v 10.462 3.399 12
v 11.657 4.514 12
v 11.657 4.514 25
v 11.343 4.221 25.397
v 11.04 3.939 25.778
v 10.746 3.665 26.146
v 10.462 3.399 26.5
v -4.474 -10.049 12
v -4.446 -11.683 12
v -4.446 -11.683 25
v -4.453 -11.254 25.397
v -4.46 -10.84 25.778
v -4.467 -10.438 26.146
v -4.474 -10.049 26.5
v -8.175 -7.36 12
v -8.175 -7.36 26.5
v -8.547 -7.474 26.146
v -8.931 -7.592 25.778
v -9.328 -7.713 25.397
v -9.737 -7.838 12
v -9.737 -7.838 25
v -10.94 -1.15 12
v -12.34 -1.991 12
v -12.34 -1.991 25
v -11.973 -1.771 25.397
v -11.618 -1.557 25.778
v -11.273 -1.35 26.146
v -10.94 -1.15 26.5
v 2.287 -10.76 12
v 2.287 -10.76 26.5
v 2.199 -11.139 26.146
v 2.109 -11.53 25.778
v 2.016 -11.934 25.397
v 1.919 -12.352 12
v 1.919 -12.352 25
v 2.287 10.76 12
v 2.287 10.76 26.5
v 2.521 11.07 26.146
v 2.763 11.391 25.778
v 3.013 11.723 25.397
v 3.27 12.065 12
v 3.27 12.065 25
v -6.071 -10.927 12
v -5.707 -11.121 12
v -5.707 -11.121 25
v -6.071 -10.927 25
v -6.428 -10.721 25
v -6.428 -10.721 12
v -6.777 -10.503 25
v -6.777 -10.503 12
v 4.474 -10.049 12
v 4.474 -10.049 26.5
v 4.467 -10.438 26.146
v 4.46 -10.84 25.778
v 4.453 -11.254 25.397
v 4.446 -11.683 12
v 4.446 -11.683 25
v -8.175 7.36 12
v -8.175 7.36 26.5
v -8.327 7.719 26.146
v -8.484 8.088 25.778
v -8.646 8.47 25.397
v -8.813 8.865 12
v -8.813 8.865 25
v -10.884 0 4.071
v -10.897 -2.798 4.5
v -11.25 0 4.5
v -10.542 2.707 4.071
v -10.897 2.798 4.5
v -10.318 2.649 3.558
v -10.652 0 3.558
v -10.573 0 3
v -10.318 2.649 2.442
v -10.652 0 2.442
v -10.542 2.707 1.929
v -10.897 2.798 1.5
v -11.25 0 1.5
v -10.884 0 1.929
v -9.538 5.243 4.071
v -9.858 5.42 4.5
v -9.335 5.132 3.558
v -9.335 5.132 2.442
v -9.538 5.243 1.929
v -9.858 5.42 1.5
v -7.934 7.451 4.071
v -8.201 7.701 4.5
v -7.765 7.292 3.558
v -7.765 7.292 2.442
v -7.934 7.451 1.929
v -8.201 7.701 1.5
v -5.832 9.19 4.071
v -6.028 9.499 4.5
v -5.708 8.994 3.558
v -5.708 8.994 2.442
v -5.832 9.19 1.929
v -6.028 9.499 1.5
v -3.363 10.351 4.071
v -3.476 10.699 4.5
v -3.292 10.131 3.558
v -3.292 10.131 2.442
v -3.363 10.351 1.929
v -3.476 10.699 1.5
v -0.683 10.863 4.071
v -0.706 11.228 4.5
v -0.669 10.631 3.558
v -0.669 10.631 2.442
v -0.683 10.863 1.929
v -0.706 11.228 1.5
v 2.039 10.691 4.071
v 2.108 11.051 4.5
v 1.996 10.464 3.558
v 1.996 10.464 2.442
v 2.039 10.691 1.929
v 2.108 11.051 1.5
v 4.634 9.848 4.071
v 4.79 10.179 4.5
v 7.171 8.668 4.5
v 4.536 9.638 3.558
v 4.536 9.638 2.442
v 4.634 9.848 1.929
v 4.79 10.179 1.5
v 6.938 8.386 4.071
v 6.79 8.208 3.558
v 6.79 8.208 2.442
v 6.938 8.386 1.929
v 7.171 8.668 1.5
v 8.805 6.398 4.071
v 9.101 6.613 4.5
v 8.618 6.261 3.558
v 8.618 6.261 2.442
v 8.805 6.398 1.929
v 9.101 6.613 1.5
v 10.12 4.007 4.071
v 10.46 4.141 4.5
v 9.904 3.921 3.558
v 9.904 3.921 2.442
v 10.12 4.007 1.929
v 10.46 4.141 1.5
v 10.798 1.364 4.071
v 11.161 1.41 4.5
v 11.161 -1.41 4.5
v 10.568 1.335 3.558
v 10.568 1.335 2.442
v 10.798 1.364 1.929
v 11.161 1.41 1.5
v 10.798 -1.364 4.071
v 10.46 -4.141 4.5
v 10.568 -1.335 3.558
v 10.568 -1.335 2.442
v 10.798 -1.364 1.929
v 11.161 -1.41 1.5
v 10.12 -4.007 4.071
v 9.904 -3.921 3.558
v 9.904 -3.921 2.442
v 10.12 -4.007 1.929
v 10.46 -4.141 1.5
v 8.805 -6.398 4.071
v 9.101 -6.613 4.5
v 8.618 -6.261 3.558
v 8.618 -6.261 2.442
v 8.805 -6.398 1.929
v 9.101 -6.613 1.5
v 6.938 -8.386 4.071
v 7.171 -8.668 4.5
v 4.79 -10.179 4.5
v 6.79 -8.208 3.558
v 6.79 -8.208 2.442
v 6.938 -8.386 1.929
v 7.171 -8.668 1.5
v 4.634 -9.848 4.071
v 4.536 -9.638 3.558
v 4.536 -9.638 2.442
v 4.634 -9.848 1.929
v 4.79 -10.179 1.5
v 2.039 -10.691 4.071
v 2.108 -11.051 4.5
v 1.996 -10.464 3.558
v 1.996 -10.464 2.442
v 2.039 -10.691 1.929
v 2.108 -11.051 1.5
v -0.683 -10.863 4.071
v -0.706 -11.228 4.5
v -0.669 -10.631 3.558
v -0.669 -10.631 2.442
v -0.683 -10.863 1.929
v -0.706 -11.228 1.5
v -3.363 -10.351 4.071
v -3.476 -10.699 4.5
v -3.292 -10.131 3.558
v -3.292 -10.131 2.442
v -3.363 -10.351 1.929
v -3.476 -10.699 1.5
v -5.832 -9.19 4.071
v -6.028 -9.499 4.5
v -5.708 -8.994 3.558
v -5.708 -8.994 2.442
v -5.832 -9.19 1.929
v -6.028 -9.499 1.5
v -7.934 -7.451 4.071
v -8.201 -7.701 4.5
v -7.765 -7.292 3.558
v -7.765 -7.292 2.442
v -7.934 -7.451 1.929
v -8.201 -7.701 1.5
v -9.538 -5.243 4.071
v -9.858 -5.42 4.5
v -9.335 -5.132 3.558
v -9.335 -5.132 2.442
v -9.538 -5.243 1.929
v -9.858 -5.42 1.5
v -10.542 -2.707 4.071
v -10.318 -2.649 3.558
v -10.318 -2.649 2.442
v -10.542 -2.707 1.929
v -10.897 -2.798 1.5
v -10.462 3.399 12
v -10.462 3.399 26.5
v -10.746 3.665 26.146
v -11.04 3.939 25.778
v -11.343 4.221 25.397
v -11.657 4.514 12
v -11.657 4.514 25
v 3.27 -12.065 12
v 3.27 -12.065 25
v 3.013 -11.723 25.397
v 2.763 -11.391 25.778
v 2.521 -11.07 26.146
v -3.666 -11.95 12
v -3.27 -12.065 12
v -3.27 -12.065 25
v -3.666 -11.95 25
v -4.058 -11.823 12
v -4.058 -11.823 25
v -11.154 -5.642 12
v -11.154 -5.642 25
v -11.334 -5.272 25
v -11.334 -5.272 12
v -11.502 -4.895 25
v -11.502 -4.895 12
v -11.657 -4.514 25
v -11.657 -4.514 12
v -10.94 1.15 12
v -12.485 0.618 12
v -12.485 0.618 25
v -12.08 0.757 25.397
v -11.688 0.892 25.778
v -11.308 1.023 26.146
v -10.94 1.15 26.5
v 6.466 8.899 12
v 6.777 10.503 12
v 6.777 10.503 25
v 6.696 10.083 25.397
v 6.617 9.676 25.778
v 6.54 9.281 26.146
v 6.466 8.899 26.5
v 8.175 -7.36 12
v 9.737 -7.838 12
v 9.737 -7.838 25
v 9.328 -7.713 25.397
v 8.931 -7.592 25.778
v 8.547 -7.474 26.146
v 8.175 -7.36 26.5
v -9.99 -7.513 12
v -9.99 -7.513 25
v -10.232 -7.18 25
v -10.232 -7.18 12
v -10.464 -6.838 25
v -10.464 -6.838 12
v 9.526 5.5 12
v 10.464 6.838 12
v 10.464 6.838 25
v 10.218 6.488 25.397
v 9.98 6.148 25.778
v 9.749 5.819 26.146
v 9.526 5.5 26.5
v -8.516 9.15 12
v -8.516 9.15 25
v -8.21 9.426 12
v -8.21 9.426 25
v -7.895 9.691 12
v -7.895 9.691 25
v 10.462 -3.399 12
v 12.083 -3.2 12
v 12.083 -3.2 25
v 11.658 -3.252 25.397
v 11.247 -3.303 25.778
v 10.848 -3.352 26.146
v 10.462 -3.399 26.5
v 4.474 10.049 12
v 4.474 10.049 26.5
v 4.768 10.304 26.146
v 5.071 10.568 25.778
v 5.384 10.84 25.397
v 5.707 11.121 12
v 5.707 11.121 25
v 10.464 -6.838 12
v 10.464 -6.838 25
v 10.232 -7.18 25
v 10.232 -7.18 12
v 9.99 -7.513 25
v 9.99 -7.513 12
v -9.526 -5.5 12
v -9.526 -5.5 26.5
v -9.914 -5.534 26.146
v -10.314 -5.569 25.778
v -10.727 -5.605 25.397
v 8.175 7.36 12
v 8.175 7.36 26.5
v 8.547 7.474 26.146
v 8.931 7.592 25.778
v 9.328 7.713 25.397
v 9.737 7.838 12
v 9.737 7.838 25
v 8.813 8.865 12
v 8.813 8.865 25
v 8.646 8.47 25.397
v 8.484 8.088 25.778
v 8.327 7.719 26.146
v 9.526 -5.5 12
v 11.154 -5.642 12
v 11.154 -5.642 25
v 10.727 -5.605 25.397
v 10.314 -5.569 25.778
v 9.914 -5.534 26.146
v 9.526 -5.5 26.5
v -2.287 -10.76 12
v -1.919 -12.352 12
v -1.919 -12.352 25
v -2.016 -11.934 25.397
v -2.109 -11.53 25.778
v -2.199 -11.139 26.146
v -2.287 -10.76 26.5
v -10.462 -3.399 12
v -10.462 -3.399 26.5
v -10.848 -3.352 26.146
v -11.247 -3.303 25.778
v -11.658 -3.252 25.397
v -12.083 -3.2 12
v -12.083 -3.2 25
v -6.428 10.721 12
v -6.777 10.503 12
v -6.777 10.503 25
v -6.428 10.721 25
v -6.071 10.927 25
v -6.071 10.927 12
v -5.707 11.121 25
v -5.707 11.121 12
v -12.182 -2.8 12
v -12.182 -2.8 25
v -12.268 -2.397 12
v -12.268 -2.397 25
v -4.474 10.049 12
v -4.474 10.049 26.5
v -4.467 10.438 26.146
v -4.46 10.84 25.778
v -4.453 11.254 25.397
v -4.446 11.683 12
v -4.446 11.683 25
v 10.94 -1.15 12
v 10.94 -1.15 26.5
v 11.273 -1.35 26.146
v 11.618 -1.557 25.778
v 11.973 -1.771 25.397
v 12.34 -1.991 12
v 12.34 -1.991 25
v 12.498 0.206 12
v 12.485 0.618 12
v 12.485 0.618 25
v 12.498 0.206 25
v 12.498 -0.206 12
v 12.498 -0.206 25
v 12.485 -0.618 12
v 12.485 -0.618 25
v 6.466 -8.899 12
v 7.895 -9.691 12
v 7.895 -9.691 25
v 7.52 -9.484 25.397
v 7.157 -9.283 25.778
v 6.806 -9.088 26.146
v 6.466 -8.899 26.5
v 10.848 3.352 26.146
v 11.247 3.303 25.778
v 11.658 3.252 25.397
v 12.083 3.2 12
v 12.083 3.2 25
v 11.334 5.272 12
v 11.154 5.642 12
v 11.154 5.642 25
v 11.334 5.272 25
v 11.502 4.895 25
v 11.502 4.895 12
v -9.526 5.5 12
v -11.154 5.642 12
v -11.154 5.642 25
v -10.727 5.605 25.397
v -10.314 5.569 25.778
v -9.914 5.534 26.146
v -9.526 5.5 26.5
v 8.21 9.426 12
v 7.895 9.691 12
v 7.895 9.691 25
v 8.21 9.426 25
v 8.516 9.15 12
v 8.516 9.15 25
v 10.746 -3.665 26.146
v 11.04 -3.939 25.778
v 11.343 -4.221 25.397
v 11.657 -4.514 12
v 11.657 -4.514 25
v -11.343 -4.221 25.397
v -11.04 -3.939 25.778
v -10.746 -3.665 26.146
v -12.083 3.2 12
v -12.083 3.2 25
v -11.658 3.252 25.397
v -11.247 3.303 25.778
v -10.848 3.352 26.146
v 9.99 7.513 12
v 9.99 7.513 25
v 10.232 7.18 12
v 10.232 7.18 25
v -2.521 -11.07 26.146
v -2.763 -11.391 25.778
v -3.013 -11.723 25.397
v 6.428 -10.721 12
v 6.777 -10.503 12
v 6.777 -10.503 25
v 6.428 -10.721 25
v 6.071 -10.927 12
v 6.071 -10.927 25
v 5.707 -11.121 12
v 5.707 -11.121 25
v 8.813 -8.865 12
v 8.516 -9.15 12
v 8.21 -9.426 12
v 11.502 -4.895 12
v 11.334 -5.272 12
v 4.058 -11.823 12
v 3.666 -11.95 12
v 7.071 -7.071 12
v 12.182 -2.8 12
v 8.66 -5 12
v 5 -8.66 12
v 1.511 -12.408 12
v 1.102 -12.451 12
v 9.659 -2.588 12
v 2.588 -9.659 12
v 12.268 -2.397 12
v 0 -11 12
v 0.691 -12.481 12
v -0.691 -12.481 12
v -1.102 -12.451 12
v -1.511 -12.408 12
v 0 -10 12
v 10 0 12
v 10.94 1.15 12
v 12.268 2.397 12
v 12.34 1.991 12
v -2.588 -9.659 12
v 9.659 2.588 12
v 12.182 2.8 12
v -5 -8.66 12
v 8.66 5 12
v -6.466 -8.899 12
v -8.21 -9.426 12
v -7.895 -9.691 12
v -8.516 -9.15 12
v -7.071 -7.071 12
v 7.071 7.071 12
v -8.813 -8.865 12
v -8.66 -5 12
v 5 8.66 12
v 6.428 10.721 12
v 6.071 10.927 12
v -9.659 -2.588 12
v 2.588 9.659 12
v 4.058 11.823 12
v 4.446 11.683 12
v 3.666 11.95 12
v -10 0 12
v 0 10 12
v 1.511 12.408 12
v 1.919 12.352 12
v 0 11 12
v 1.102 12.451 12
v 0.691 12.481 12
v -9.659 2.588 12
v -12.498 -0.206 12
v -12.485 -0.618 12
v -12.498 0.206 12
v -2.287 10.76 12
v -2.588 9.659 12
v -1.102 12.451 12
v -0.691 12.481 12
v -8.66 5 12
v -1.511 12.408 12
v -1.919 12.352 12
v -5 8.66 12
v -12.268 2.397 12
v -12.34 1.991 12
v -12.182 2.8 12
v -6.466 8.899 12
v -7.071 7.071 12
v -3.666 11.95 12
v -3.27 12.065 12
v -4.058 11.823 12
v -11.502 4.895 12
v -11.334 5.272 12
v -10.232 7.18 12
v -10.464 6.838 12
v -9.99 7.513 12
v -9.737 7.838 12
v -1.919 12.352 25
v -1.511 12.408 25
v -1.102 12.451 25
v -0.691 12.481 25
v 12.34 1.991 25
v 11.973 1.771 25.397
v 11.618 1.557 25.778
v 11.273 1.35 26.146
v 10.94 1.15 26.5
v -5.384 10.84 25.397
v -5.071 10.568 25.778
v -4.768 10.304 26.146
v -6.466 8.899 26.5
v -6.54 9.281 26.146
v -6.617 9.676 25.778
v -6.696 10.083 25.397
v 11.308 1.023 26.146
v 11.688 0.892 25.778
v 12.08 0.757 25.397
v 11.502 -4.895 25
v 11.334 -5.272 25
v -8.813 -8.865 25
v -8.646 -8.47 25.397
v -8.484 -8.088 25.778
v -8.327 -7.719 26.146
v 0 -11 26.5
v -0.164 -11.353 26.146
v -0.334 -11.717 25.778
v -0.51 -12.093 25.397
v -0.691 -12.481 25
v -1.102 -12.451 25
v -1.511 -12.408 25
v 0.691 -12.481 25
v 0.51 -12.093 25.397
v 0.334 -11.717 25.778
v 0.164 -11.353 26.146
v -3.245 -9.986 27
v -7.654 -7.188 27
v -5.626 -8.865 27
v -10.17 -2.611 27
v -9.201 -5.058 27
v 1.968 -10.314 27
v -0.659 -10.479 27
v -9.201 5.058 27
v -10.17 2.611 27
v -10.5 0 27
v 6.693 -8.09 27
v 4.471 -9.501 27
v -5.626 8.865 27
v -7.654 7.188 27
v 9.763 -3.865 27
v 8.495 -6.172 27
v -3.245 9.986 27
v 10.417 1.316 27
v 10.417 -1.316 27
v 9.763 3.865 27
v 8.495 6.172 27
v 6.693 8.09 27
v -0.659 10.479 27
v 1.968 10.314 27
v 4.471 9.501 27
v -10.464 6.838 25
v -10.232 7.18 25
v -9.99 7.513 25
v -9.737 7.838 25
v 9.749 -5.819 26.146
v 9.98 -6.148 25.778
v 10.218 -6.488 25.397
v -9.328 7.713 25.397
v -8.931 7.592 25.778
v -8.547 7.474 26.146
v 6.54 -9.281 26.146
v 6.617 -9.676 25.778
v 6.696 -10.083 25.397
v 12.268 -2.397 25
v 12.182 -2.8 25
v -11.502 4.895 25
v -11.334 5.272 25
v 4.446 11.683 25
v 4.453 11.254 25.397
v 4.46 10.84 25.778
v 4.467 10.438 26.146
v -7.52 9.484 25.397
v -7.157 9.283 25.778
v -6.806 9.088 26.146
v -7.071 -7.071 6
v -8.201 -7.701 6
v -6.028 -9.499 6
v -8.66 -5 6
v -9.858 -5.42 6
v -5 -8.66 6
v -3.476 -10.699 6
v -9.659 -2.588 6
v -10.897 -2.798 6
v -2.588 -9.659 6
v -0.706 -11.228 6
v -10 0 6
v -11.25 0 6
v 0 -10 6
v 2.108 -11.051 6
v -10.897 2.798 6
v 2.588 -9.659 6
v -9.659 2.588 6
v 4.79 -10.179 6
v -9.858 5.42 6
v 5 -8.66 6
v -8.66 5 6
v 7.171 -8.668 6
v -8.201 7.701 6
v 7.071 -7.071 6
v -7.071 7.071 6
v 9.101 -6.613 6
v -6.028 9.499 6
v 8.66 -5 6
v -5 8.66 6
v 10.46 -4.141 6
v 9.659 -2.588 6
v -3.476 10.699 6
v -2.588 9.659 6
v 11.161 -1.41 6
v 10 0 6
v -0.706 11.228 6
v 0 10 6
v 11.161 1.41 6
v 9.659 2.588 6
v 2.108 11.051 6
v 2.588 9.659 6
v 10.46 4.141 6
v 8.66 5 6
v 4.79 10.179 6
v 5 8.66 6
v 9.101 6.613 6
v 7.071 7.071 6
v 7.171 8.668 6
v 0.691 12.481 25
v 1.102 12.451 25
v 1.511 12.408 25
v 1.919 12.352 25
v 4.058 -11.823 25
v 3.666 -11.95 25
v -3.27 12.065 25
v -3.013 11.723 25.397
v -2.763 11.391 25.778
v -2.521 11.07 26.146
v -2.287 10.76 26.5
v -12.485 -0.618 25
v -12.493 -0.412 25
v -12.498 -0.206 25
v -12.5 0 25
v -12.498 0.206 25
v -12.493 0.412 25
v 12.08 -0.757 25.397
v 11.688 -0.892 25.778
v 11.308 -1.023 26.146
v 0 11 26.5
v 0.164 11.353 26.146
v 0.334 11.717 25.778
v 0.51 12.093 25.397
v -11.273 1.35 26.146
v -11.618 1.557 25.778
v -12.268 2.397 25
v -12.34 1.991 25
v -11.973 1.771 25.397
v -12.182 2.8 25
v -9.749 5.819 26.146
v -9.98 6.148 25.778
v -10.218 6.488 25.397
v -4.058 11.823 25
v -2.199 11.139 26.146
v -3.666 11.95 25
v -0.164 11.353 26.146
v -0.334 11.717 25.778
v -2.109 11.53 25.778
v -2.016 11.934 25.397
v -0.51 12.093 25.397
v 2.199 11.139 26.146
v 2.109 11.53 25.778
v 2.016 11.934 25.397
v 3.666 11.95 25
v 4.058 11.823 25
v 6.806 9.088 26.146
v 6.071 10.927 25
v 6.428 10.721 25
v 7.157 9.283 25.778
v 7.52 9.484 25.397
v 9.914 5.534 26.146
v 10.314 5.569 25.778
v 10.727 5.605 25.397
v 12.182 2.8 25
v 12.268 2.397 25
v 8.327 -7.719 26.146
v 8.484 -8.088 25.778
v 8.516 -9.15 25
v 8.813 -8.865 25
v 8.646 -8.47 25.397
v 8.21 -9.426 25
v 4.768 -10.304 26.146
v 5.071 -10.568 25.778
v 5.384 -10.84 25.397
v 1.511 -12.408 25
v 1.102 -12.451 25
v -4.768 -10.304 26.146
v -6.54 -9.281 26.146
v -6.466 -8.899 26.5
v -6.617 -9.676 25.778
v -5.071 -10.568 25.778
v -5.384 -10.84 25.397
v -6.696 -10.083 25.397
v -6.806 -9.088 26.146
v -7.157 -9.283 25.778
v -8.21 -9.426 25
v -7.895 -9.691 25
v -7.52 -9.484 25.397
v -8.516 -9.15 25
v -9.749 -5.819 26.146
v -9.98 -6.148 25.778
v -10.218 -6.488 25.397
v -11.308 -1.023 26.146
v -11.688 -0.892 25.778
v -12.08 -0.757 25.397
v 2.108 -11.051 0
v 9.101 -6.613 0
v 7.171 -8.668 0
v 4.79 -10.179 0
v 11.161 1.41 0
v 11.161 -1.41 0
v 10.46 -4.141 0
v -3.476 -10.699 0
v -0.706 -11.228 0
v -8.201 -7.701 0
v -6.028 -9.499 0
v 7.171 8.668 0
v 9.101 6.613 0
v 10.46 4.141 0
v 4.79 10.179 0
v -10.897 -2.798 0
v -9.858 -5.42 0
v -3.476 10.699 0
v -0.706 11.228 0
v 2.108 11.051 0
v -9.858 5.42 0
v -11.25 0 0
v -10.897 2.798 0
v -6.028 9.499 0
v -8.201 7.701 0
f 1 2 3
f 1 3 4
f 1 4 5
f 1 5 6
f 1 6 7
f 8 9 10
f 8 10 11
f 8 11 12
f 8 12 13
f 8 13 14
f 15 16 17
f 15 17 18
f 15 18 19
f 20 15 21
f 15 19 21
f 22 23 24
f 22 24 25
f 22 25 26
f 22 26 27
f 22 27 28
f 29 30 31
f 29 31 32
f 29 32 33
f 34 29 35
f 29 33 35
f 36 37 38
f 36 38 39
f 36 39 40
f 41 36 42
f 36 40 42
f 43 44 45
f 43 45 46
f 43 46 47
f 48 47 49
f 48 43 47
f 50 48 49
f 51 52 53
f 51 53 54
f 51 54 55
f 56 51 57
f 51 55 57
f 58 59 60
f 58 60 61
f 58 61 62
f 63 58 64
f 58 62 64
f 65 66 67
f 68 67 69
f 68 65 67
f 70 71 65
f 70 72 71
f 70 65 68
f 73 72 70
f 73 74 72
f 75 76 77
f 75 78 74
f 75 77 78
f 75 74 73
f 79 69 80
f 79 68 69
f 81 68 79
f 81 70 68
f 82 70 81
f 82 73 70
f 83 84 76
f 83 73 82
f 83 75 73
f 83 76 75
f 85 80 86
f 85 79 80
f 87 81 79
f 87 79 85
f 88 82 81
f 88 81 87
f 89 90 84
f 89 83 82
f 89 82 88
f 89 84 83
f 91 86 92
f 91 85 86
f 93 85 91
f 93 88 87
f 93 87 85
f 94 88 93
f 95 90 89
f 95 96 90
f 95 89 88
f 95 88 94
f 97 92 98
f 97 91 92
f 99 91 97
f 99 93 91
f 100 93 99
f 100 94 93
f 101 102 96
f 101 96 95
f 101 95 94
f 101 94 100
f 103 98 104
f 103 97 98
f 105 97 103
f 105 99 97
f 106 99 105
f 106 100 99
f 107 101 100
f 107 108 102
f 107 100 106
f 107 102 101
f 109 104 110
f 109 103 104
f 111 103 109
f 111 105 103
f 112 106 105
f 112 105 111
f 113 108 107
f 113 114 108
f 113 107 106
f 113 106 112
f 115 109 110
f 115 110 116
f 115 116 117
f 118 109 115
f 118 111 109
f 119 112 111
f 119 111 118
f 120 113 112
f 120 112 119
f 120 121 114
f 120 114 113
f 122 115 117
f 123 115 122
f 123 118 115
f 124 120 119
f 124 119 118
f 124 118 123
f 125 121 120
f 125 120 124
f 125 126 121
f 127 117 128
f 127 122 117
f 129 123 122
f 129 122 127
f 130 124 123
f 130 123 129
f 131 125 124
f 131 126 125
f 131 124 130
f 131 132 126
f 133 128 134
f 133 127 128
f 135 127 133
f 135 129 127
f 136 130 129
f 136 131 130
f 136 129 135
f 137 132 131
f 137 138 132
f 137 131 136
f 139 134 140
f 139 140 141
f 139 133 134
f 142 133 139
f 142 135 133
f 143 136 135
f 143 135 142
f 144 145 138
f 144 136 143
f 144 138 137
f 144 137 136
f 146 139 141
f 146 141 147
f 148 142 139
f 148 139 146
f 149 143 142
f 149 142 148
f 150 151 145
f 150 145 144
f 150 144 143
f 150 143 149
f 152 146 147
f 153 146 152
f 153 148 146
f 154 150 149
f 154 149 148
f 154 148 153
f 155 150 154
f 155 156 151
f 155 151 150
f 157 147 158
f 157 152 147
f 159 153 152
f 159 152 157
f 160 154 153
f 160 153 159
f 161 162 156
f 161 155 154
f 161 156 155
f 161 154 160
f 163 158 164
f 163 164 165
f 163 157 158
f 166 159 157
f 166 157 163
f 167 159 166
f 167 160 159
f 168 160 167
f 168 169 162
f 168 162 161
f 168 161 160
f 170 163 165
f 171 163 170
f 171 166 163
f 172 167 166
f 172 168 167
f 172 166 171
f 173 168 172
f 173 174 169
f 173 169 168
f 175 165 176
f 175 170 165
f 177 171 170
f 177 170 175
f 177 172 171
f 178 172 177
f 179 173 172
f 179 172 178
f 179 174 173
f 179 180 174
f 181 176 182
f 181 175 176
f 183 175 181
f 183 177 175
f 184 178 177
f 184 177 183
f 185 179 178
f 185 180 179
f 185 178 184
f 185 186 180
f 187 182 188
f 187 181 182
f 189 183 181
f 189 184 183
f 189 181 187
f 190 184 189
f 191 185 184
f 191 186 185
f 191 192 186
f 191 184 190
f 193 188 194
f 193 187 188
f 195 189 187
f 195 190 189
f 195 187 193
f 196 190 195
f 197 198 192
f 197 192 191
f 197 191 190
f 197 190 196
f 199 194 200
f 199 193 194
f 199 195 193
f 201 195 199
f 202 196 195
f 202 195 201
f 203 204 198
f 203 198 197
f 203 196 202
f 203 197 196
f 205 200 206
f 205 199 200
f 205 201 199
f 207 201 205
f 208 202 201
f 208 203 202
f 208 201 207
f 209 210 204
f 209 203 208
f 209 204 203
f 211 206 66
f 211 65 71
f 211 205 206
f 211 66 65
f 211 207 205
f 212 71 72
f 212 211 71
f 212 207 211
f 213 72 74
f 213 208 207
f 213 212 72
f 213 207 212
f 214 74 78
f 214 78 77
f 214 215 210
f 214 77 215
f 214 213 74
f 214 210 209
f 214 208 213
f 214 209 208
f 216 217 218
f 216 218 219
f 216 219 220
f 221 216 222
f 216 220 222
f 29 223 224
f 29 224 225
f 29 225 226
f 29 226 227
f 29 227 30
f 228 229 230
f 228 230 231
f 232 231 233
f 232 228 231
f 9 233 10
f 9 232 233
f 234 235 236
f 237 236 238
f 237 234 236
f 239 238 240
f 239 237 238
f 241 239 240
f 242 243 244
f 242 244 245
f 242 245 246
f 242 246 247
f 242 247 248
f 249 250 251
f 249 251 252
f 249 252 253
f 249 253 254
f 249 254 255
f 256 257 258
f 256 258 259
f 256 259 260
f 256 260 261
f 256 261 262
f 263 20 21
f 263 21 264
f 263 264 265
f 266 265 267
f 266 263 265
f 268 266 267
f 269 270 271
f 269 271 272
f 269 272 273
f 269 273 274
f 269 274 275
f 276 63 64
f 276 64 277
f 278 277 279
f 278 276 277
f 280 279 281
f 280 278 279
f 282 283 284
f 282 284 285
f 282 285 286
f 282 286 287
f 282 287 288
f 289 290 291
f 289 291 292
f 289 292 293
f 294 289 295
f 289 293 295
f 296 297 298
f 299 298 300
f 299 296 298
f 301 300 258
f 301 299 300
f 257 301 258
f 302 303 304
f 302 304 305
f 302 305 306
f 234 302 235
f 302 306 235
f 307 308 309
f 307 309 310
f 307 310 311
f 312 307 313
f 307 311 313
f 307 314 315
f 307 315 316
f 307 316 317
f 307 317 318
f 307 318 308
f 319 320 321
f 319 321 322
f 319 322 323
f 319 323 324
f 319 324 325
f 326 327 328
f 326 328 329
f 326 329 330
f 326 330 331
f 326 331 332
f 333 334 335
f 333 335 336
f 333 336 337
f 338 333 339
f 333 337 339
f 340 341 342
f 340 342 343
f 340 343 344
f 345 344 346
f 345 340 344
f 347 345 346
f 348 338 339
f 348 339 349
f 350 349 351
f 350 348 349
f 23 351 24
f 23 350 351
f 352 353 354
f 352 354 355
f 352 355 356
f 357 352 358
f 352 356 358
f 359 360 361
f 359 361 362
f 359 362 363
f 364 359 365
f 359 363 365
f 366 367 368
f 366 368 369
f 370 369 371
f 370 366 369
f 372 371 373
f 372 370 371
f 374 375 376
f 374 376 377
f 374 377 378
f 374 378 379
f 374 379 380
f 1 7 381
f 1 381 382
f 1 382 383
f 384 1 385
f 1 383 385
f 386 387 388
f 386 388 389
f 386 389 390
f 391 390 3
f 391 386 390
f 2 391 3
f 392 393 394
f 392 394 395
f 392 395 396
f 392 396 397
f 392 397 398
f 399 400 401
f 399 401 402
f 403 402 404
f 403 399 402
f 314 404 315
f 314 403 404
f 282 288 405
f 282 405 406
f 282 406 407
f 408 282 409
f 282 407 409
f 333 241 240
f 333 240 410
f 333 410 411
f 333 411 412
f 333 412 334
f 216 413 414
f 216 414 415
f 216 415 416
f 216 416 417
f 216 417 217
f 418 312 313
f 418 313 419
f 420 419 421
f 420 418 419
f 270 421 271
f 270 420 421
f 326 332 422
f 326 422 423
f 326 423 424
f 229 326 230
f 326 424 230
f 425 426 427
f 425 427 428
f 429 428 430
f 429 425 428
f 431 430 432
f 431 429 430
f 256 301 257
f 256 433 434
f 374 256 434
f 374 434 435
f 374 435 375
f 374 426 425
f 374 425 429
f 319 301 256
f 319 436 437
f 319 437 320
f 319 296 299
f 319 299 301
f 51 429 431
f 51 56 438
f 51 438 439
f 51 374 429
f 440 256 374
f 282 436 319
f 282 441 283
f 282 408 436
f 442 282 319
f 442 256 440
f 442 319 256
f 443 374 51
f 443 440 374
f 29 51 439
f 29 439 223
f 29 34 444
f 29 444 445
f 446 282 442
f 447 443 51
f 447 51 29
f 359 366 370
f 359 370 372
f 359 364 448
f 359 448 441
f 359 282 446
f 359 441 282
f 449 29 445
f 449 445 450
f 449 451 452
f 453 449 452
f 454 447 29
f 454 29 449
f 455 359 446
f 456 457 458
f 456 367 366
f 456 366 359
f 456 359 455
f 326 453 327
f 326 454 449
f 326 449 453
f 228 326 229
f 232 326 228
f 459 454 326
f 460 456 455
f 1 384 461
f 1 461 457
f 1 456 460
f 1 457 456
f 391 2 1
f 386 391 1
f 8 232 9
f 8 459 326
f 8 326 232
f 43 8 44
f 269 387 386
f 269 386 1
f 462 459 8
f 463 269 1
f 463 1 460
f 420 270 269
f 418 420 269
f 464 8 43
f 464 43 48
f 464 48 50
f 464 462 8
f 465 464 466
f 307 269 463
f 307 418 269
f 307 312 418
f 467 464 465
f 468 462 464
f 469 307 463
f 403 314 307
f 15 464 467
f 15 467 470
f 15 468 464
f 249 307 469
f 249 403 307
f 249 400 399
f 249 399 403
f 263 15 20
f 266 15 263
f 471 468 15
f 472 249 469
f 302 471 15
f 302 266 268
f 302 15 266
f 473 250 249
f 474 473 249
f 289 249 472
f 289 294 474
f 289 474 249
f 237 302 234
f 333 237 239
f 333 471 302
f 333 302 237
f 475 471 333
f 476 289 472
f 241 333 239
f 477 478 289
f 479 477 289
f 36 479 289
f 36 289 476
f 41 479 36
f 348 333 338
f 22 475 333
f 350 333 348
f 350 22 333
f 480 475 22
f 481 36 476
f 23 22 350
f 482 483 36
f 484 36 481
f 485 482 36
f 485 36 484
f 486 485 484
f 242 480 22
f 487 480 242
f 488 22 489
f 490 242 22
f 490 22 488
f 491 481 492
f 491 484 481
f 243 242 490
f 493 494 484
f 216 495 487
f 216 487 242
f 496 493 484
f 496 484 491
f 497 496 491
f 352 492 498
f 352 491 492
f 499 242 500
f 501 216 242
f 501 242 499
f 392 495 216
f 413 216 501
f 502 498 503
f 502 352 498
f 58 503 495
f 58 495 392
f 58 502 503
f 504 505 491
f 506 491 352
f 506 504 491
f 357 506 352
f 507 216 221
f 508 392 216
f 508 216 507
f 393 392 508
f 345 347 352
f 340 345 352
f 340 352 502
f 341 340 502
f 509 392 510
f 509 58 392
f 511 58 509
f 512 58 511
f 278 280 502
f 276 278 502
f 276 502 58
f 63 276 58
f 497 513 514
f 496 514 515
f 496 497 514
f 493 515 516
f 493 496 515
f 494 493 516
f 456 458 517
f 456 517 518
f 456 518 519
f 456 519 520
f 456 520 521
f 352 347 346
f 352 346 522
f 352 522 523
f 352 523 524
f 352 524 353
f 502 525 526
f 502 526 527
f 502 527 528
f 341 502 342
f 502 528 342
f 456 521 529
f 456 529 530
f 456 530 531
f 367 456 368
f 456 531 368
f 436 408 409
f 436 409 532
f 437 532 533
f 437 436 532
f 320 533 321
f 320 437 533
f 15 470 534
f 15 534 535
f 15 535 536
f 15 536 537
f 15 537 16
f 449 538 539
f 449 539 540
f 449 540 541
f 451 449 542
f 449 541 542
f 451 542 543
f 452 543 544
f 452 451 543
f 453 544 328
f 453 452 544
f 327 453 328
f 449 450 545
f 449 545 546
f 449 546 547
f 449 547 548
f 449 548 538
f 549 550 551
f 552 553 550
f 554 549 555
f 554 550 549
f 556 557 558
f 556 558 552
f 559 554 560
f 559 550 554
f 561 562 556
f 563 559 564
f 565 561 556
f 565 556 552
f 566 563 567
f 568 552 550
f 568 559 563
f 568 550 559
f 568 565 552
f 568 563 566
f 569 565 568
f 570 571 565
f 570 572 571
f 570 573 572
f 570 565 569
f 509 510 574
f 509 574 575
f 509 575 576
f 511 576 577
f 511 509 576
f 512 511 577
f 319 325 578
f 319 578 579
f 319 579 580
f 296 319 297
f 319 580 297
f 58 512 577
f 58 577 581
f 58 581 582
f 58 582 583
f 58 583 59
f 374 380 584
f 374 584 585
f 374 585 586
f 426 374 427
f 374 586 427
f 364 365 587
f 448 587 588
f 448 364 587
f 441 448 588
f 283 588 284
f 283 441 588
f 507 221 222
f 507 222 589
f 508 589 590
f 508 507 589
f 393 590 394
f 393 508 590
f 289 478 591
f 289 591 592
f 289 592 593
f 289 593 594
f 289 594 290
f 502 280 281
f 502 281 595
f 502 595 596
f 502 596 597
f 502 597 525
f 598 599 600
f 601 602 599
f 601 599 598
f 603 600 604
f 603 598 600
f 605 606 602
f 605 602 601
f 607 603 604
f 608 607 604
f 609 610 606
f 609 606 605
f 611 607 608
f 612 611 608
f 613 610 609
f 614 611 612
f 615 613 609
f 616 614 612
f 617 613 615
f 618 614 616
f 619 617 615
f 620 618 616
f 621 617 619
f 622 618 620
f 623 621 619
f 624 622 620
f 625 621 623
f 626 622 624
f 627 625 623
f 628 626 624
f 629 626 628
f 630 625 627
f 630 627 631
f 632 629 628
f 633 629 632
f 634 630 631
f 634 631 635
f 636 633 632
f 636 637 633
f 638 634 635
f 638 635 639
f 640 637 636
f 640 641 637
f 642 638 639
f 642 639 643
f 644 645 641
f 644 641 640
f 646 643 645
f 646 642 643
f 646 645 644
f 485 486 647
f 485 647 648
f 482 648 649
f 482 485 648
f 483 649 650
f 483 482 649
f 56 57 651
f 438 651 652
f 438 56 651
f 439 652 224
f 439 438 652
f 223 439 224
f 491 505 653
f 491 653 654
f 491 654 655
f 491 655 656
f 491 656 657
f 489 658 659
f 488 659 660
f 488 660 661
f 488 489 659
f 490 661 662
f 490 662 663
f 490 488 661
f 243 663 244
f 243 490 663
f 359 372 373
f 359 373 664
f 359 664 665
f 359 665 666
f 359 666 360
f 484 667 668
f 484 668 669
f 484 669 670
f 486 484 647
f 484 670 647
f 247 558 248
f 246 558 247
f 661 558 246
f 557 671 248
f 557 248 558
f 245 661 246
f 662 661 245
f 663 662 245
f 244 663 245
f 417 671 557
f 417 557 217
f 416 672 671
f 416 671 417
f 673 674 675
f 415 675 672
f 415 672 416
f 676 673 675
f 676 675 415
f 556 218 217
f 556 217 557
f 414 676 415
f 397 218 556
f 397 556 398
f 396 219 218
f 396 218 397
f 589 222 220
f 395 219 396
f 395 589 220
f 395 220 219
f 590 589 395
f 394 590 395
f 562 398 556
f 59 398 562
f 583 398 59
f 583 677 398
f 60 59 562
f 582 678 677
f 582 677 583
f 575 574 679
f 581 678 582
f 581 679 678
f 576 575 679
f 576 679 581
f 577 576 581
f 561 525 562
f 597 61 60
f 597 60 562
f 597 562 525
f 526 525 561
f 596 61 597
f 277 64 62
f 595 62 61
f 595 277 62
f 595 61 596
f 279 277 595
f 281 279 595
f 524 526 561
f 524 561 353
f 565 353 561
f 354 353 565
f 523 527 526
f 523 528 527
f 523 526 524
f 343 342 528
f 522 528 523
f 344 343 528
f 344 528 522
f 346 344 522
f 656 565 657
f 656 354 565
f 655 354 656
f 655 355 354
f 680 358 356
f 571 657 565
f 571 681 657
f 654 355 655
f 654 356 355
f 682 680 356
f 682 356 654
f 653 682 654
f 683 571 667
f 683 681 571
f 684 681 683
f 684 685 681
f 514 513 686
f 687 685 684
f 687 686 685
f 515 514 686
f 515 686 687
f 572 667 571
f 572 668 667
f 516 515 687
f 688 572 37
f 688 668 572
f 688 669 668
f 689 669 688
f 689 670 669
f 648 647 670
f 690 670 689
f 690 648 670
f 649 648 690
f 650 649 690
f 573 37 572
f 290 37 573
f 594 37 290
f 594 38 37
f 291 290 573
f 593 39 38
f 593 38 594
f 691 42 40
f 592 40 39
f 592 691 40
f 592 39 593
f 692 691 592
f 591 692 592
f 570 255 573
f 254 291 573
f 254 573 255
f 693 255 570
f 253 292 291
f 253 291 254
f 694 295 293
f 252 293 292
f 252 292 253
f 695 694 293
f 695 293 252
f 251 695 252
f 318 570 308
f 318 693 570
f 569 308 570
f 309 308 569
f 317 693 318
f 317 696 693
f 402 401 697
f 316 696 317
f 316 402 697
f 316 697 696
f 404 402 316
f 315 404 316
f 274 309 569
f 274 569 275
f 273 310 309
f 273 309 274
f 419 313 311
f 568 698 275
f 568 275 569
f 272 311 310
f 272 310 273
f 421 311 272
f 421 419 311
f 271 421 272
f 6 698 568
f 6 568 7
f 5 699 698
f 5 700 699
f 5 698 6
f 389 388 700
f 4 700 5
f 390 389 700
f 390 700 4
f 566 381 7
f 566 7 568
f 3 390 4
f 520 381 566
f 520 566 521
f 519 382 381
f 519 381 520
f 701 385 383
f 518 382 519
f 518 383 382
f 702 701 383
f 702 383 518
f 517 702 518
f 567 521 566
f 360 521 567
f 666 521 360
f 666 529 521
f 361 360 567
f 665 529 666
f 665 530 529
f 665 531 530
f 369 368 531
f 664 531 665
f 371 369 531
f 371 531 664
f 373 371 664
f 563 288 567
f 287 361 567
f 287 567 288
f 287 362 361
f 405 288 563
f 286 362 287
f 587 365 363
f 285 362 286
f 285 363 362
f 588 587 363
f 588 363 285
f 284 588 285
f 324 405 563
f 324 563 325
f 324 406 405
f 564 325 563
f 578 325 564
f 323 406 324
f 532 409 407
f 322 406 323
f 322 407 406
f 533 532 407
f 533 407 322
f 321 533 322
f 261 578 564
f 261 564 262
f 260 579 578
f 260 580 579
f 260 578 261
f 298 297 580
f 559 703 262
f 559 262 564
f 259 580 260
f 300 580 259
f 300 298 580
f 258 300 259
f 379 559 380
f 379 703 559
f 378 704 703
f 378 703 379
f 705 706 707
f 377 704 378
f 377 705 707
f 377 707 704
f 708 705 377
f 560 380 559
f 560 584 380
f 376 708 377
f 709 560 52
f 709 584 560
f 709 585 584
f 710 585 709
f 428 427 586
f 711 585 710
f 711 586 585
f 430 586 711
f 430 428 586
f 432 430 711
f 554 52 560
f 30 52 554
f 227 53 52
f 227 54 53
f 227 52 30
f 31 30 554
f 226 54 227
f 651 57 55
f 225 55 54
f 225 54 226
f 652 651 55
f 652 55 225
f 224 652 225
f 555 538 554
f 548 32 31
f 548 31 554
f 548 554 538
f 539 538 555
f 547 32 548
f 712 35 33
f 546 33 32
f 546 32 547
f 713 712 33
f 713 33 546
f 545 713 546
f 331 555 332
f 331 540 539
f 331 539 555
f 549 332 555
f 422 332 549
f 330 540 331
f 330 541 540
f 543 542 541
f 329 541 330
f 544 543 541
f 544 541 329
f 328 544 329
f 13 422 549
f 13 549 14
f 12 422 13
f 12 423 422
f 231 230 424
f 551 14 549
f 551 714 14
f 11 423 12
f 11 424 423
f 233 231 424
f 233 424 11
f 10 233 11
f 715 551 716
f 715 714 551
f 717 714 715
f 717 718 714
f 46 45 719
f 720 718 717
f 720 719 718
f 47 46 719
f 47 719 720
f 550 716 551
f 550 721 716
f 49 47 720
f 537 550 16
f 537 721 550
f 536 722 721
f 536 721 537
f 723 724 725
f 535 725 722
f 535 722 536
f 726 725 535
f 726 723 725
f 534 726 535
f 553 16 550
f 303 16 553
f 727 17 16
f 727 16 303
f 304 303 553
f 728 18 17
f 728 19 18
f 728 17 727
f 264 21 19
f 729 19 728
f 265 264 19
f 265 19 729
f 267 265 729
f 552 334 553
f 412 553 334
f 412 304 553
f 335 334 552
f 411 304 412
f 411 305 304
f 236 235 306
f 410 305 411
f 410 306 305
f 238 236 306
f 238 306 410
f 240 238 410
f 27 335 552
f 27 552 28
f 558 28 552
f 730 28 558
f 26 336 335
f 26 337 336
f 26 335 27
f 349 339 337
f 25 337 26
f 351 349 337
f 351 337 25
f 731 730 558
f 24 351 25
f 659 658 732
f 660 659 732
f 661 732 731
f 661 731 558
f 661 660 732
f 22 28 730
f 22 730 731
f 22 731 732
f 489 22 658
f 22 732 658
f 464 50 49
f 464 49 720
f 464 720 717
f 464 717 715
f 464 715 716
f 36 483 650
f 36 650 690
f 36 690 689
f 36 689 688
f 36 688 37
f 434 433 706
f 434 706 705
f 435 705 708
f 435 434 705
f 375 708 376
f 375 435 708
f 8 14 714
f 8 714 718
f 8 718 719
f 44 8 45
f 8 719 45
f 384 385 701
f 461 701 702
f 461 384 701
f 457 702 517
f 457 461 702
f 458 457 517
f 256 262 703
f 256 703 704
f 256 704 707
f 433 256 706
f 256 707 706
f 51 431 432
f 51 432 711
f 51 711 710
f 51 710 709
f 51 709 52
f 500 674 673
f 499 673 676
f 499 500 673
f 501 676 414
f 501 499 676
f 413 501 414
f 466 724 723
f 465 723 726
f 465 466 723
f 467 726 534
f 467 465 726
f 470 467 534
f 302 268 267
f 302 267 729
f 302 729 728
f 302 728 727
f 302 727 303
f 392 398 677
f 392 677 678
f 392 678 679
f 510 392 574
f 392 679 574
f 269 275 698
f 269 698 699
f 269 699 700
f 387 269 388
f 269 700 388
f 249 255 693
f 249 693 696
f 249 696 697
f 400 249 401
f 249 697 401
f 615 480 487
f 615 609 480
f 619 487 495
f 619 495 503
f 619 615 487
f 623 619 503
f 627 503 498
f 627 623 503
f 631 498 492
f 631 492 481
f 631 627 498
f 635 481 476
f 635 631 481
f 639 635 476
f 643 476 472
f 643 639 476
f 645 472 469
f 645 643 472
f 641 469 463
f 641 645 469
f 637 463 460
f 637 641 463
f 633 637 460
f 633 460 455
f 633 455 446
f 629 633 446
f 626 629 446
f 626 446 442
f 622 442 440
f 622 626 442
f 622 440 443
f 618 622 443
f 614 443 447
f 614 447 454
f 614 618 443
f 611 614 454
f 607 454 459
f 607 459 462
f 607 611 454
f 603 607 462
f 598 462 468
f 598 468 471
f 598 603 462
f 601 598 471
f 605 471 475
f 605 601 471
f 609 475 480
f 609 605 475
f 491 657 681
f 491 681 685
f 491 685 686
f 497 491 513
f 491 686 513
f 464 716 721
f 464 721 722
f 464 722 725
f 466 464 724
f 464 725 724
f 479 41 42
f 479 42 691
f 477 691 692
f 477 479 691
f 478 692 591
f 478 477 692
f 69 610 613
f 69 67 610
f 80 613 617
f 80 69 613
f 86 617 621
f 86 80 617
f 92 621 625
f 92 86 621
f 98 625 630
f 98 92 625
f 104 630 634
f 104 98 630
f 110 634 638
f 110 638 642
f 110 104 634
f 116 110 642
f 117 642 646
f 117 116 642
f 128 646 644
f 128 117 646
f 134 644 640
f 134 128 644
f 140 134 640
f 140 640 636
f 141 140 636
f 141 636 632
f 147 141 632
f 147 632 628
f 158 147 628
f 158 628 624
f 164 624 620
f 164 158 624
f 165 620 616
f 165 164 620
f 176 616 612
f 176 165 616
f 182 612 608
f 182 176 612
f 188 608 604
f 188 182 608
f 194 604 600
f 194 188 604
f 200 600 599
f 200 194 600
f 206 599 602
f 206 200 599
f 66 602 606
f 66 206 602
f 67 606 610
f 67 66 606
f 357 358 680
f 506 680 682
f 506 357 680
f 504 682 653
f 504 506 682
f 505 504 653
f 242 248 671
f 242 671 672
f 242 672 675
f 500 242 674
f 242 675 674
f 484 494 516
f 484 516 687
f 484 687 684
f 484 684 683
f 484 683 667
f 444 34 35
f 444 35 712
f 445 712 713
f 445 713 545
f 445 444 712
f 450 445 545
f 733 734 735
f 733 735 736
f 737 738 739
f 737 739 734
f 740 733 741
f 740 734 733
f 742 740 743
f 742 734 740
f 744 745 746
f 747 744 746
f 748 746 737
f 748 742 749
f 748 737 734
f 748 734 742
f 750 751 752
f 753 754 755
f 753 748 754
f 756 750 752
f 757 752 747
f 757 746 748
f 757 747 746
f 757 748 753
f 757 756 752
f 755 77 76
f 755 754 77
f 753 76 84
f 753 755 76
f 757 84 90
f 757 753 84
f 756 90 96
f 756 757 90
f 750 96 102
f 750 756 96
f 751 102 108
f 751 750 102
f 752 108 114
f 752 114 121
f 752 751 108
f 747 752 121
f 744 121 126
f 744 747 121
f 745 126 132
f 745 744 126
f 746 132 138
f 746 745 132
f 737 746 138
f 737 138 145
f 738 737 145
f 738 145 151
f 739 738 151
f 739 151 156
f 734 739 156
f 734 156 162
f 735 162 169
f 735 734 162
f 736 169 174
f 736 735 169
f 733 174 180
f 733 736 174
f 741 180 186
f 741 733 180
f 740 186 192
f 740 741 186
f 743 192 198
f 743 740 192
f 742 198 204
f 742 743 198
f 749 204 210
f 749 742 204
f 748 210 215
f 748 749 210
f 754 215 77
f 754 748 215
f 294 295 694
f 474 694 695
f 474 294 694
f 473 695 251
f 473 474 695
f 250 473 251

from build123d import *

# Parameters (mm, degrees)
F5_DEPTH        = 15
F5_COPIES_COUNT = 30


# Not quite as in the source:
# - a feature of the source that left no trace in its solid (it failed there, or was rolled back) is left out
# - a pattern or mirror of a feature is missing from the dataset's text; its kind, count and spacing are read off the source's solid


with BuildPart() as f3:
    # F2 (on Front) → F3 (revolve)
    with BuildSketch(Plane.XZ):
        with BuildLine():
            Line((-11.25, 0), (0, 0))
            Line((0, 0), (0, 27))
            Line((0, 27), (-10.5, 27))
            Line((-10.5, 27), (-12.5, 25))
            Line((-12.5, 25), (-12.5, 12))
            Line((-12.5, 12), (-10, 12))
            Line((-10, 12), (-10, 6))
            Line((-10, 6), (-11.25, 6))
            Line((-11.25, 6), (-11.25, 4.5))
            ThreePointArc((-11.25, 4.5), (-10.5728756555, 3), (-11.25, 1.5))
            Line((-11.25, 1.5), (-11.25, 0))
        make_face()
    revolve(axis=Axis((0, 0, 13.5), (0, 0, -1)))

    # F4 (on face) → F5 (cut)
    with BuildSketch(Plane.XY.offset(27)):
        with BuildLine():
            Line((0, 11), (0.6905599091, 12.4809105041))
            ThreePointArc((0.6905599091, 12.4809105041), (0, 12.5), (-0.6905599091, 12.4809105041))
            Line((-0.6905599091, 12.4809105041), (0, 11))
        make_face()
    f5 = extrude(amount=-F5_DEPTH, mode=Mode.SUBTRACT)

    # F5_copies: F5 ×30 about axis
    f5_copies_axis = Axis((0, 0, 0), (0, 0, 1))
    for i in range(1, F5_COPIES_COUNT):
        add(f5.rotate(f5_copies_axis, i * 360 / F5_COPIES_COUNT), mode=Mode.SUBTRACT)


solid = f3.part
